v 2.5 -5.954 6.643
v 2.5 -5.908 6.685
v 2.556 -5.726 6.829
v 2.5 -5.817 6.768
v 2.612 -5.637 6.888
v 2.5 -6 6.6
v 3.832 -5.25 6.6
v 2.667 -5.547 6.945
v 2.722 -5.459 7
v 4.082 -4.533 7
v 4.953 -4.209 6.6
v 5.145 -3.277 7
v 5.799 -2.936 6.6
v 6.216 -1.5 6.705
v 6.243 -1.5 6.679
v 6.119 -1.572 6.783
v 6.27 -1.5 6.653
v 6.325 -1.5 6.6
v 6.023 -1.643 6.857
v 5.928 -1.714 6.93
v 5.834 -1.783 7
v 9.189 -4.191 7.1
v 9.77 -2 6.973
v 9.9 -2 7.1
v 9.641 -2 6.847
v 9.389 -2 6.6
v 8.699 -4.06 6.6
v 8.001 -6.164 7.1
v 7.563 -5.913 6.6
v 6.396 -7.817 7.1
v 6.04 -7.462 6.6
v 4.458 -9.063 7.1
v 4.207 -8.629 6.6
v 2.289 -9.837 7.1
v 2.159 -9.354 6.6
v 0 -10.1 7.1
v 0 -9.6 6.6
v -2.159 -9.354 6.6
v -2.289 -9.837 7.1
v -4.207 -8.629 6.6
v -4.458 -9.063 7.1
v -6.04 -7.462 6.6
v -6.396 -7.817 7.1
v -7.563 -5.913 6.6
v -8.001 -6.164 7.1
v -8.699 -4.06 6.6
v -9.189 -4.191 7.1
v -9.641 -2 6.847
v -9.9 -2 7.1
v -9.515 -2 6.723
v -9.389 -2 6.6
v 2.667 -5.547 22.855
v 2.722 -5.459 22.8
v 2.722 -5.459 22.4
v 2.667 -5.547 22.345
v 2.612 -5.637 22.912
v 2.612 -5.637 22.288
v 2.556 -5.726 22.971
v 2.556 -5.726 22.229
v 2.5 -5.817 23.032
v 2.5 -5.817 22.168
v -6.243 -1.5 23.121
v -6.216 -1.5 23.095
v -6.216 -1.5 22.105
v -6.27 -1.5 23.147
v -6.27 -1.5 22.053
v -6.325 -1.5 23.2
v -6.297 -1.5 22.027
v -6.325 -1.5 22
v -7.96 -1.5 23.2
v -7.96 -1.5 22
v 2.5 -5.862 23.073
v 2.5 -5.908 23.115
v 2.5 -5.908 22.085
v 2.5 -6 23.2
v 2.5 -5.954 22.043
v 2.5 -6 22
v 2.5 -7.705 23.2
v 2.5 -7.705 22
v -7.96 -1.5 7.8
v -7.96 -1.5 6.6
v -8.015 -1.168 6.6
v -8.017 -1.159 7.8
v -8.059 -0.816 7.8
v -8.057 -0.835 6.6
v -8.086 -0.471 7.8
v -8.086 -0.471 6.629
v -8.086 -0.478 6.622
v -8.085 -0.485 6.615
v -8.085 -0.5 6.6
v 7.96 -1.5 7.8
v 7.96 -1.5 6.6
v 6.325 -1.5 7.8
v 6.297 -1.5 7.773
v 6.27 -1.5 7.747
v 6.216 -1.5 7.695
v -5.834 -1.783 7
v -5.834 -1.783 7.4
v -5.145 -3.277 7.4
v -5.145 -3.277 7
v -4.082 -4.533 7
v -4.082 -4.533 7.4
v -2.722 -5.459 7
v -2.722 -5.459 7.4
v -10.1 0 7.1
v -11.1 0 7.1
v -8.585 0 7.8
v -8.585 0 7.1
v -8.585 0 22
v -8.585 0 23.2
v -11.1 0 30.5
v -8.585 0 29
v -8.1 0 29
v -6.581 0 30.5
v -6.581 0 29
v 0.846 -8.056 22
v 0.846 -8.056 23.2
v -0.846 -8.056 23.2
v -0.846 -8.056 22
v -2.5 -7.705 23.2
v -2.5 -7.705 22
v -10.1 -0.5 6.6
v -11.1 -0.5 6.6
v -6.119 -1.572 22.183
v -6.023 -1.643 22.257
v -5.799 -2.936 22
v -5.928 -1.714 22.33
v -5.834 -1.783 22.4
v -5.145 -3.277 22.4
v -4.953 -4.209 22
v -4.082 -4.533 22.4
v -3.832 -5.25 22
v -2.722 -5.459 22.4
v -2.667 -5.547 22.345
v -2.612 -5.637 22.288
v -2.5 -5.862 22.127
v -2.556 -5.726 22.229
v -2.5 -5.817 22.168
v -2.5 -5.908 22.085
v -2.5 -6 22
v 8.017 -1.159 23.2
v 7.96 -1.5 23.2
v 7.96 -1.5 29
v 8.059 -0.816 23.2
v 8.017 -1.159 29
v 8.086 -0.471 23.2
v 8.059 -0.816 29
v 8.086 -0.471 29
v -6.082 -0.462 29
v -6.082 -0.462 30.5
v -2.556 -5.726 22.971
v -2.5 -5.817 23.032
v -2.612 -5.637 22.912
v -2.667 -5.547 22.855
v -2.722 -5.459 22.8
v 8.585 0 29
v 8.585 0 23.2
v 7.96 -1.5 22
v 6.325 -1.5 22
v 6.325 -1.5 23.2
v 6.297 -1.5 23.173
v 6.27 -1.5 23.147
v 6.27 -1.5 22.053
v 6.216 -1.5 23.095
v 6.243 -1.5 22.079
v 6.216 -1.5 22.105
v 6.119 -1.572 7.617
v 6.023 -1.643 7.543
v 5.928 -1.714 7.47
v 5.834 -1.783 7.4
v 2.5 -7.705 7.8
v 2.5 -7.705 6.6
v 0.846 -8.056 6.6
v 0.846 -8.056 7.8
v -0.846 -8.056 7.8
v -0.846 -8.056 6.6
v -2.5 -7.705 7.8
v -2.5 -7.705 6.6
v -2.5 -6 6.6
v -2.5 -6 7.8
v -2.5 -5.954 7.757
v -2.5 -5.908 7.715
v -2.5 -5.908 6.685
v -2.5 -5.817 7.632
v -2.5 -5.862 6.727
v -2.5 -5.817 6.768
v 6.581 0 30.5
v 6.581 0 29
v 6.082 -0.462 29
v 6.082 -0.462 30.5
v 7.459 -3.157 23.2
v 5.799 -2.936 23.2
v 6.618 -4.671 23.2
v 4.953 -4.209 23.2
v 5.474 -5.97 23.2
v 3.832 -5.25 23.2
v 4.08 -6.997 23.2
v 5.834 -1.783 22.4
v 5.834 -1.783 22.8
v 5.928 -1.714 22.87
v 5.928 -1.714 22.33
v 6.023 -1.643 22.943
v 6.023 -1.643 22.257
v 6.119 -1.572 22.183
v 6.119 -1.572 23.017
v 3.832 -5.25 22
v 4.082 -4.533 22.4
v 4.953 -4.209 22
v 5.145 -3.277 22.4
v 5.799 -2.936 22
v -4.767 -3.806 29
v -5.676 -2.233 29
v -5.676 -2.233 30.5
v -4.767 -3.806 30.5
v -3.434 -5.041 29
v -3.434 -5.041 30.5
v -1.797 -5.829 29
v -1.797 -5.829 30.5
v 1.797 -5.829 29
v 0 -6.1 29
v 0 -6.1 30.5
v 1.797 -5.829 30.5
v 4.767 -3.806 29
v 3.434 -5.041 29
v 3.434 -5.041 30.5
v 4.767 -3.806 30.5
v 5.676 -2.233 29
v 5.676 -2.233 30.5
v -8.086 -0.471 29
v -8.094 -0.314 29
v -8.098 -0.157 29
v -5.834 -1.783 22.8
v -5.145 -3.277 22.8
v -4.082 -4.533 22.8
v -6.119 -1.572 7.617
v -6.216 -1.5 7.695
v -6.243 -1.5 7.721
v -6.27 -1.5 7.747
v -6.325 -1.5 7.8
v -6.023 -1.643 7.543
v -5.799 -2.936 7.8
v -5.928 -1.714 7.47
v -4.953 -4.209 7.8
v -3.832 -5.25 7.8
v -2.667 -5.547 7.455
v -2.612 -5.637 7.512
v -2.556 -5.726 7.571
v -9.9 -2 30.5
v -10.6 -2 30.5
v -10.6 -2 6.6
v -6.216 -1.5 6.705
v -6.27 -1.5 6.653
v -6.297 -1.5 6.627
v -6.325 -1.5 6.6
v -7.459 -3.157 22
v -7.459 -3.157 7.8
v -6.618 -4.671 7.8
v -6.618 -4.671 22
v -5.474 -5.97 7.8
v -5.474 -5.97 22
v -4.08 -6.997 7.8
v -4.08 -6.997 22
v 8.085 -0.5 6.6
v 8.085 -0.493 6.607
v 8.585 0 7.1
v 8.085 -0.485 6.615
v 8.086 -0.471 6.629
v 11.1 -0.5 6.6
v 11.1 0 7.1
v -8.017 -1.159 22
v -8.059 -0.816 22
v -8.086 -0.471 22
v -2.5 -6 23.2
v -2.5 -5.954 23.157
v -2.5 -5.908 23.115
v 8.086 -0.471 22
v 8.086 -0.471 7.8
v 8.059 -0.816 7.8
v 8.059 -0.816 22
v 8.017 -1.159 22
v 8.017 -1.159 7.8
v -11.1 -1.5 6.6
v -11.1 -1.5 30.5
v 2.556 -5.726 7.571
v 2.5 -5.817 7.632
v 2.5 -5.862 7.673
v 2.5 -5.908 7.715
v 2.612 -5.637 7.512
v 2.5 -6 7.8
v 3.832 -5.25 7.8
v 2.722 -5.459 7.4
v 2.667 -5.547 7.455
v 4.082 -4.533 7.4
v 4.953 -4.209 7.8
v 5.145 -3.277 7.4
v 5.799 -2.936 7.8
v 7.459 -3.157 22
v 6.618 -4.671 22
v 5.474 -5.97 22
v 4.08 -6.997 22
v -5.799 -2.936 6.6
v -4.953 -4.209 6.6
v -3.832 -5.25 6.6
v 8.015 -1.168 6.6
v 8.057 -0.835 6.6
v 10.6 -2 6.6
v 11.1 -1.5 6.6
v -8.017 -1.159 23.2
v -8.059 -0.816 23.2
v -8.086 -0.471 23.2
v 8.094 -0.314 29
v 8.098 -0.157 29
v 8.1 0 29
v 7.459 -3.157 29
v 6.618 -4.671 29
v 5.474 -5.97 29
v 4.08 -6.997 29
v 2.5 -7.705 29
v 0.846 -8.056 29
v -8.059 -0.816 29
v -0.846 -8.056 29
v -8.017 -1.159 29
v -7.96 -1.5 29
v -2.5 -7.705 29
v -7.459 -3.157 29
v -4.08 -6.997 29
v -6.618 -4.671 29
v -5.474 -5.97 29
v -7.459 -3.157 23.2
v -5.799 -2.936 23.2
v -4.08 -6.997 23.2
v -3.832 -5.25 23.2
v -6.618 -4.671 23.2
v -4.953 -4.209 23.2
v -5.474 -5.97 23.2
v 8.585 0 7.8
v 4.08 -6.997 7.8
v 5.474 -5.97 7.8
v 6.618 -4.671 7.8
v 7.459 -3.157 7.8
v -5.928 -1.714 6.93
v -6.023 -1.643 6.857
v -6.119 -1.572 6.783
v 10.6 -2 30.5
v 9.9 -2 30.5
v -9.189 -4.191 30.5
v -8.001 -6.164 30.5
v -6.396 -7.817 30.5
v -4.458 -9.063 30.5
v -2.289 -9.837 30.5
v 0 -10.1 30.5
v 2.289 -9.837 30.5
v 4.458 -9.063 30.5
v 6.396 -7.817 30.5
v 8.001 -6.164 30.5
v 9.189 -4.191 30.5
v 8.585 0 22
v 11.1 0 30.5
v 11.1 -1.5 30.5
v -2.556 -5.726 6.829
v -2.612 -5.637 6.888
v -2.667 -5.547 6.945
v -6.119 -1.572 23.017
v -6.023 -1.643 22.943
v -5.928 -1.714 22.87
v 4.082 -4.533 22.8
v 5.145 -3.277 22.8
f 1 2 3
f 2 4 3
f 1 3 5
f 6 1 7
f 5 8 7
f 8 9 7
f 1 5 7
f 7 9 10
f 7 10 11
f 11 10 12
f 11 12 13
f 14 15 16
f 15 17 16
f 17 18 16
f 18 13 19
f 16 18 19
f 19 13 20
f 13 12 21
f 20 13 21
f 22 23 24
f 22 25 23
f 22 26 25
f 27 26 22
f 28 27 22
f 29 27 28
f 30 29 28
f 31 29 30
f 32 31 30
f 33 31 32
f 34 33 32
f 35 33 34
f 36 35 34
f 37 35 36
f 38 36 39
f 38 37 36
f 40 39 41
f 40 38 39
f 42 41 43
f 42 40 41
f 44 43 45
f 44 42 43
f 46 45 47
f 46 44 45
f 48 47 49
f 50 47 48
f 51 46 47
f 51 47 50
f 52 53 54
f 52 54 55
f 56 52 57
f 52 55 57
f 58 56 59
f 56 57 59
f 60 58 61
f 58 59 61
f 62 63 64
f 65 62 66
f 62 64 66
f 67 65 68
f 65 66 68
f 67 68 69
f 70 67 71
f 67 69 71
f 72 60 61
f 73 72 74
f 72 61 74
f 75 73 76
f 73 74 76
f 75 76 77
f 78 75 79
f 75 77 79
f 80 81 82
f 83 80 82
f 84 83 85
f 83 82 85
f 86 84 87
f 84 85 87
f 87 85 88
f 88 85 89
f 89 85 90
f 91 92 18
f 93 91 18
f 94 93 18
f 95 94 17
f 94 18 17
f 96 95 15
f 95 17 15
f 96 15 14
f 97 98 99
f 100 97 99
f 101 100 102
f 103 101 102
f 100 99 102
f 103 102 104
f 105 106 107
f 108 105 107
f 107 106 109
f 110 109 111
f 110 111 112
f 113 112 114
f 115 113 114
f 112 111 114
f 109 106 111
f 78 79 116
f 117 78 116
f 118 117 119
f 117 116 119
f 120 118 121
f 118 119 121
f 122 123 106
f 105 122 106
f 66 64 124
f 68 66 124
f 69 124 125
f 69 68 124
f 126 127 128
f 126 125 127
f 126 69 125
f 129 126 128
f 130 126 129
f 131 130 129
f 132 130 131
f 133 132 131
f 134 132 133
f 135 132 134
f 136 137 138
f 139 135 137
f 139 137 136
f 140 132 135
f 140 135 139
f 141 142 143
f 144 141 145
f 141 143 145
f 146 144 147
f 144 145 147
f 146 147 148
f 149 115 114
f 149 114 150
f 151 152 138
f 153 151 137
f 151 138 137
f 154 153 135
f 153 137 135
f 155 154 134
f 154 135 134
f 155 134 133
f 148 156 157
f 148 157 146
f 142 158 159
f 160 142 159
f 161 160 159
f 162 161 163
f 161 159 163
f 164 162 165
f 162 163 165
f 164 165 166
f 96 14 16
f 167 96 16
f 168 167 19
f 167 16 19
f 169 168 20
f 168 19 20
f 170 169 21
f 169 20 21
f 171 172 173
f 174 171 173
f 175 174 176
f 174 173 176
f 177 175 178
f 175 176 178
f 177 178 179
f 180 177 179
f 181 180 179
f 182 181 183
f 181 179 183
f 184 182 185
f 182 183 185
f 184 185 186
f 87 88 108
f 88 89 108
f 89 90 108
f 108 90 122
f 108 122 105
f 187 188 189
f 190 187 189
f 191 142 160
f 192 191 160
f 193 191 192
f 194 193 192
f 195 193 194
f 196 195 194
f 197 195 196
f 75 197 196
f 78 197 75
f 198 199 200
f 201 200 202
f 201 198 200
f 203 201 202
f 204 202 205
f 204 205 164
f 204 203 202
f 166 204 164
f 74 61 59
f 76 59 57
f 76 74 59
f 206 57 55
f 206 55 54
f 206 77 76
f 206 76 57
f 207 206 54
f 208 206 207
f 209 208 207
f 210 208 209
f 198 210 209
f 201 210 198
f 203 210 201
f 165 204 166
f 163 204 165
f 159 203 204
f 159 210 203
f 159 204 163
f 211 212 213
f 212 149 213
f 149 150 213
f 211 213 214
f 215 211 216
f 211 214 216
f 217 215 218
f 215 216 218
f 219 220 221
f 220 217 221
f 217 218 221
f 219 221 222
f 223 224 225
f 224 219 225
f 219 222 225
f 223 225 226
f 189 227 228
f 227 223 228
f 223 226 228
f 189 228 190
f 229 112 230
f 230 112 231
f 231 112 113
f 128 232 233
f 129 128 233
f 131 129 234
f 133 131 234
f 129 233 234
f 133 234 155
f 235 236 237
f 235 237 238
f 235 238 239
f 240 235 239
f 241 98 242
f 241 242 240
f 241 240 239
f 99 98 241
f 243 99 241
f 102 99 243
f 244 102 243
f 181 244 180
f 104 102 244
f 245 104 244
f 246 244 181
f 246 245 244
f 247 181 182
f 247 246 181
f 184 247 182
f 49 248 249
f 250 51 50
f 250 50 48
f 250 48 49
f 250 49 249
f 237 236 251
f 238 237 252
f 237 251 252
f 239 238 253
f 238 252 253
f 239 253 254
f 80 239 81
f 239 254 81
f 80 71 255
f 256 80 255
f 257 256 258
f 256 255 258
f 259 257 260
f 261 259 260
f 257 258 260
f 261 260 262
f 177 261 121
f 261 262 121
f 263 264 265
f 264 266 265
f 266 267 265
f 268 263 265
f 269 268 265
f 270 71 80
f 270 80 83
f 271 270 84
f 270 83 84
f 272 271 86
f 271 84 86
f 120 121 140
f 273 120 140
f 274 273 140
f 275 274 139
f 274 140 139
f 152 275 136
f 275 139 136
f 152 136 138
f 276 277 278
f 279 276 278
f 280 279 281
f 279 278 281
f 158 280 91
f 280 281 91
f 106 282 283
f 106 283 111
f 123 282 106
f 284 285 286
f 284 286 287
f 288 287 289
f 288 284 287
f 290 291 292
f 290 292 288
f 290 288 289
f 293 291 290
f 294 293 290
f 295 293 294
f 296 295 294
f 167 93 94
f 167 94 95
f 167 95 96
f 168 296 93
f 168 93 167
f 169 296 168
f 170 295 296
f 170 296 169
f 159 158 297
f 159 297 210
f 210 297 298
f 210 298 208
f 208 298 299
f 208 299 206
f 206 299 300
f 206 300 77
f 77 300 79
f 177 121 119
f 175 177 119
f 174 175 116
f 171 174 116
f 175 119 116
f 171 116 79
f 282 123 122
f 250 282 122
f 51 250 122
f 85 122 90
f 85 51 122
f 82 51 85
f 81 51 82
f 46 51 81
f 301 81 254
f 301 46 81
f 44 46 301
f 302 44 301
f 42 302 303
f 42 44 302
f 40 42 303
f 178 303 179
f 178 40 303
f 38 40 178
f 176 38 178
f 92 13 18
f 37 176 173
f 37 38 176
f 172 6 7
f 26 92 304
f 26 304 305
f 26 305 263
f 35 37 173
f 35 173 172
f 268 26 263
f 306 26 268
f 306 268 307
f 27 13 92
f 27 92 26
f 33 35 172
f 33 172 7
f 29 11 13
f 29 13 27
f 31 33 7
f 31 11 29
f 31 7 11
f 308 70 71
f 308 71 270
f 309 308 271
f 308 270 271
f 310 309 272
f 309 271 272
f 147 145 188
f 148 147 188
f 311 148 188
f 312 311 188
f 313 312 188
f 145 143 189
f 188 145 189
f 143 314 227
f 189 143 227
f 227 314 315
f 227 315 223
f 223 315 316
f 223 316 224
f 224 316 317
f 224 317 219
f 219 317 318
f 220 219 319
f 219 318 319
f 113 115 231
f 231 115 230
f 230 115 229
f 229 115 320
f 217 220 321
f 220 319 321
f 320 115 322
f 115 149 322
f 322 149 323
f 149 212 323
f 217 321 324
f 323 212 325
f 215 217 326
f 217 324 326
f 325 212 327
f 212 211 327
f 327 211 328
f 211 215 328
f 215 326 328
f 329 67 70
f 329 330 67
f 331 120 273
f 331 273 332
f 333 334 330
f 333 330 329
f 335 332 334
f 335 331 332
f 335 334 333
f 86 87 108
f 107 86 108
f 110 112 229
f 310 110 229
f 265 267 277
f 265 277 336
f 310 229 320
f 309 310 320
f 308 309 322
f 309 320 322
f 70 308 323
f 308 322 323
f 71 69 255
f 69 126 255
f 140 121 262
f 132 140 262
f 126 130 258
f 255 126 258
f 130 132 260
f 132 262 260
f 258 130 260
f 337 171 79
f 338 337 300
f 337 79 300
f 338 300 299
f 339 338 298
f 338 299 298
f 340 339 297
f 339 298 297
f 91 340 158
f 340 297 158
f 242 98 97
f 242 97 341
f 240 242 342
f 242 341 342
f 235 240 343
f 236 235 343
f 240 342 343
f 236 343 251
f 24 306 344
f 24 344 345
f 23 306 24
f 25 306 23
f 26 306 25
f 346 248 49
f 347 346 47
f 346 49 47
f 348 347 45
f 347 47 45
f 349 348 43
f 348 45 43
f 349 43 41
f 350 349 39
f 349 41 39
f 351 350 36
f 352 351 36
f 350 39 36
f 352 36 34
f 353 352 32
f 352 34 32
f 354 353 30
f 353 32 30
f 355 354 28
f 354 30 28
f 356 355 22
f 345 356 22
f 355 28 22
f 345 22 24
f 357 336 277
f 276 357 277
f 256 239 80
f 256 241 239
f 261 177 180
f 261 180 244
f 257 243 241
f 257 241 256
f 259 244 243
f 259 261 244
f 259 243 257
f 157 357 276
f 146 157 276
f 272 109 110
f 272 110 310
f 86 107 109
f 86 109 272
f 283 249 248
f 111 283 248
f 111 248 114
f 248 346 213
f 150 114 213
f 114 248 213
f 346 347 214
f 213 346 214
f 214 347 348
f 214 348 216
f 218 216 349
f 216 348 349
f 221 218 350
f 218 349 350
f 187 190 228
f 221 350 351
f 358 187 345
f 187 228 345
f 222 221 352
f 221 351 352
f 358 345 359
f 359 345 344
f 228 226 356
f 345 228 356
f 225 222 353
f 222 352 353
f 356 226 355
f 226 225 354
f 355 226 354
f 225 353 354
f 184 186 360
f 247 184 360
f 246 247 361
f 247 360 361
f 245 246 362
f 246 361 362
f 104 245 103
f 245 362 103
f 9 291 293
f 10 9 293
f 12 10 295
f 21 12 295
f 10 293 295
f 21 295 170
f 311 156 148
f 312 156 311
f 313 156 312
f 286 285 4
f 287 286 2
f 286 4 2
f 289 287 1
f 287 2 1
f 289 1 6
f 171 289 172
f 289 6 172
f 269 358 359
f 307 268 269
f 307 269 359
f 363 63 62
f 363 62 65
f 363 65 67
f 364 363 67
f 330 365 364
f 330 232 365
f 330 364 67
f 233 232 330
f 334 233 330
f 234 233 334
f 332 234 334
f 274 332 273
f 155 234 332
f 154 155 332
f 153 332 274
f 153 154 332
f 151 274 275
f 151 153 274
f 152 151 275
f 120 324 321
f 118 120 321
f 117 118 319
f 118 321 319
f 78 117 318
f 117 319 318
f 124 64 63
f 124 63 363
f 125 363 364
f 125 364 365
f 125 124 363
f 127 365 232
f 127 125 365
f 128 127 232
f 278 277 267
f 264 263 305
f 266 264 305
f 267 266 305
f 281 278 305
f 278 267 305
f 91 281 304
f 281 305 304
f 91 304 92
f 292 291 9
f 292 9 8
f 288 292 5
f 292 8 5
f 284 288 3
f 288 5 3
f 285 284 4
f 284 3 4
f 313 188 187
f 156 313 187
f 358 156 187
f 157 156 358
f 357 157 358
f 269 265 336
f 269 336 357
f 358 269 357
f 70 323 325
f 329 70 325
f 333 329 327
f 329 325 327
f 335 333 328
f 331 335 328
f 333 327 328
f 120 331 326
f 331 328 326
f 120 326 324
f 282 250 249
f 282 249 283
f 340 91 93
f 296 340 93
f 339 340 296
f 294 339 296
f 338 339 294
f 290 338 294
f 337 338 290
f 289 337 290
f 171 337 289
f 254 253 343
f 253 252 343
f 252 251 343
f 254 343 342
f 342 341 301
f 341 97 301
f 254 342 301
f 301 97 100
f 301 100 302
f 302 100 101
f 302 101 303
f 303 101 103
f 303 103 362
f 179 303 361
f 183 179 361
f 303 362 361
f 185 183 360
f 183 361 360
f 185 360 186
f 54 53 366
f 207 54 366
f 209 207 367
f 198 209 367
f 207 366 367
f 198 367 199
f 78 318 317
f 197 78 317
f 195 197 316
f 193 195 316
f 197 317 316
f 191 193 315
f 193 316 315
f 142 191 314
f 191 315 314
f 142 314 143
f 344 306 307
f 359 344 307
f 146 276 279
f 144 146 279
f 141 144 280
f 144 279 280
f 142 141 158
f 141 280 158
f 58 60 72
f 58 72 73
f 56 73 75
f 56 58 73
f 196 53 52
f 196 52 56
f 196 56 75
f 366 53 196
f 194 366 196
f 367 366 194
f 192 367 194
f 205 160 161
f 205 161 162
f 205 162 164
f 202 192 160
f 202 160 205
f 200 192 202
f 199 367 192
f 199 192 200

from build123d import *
from build123d import SkipClean  # not in build123d's __all__

# Parameters (mm, degrees)
F0_W         = 2
F0_H         = 1.2
F1_ANGLE     = 180
F3_DEPTH     = 29
F5_DEPTH     = 30.5
F6_DEPTH     = 6.6
F7_T1_DEPTH  = 26.471682988
F7_T3_DEPTH  = 14.2
F7_T5_DEPTH  = 2.285841494
F7_T7_DEPTH  = 3.285841494
F7_T9_DEPTH  = 3.9794390696
F7_T11_DEPTH = 3.285841494
F7_T13_DEPTH = 2.285841494
F7_T15_DEPTH = 2.4504714643
F7_T17_DEPTH = 1.2
F7_T19_DEPTH = 5.8
F7_T24_ANGLE = 171.7642778101
F8_T1_DEPTH  = 2.5339152929
F8_T3_DEPTH  = 2.7820723675
F8_T5_DEPTH  = 2.7820723675
F8_T7_DEPTH  = 2.5339152929
F8_T10_ANGLE = 70.8970289143
F8_T12_ANGLE = 70.8970289143
F8_T14_ANGLE = 70.8970289143
F8_T16_ANGLE = 70.8970289143
F8_T18_ANGLE = 70.8970289143
F8_T20_ANGLE = 70.8970289143
F8_T22_ANGLE = 70.8970289143
F8_T24_ANGLE = 70.8970289143


# Not quite as in the source:
# - a fillet or chamfer that OpenCascade refuses, or shapes differently, is made with other operations: its cross-section is extruded or revolved along the edge and cut away or added
# - a feature names something its author has since deleted; it is built from what else it names


with BuildPart() as f1:
    # F0 (on Front) → F1 (revolve)
    with BuildSketch(Plane.XZ):
        Polygon((-10.1, 0), (-8.1, 0), (-8.1, 6.6), (-8.1, 7.8), (-8.1, 12.7), (-8.1, 13.9), (-8.1, 15.8), (-8.1, 17), (-8.1, 22), (-8.1, 23.2), (-8.1, 29), (-10.1, 29), align=None)
        with Locations((-7.1, 22.6)):
            Rectangle(F0_W, F0_H)
        with Locations((-7.1, 7.2)):
            Rectangle(F0_W, F0_H)
        Polygon((-10.1, 30.5), (-10.1, 29), (-8.1, 29), (-6.1, 29), (-6.1, 30.5), align=None)
    revolve(axis=Axis((0, 0, 18.970021978), (0, 0, 1)), revolution_arc=F1_ANGLE)

    # F2 (on face) → F3 (cut, through all)
    with BuildSketch(Plane(origin=(0, 0, 0), x_dir=(1, 0, 0), z_dir=(0, 0, -1))):
        with BuildLine():
            Line((2.5, 5.5641710973), (2.5, 7.7045441137))
            ThreePointArc((2.5, 7.7045441137), (0, 8.1), (-2.5, 7.7045441137))
            Line((-2.5, 7.7045441137), (-2.5, 5.5641710973))
            Line((-2.5, 5.5641710973), (2.5, 5.5641710973))
        make_face()
        with BuildLine():
            ThreePointArc((8.1, 0), (8.0648988191, 0.7532642549), (7.9598994969, 1.5))
            Line((7.9598994969, 1.5), (5.9126981996, 1.5))
            Line((5.9126981996, 1.5), (5.9126981996, 0))
            Line((5.9126981996, 0), (8.1, 0))
        make_face()
        with BuildLine():
            Line((-5.9126981996, 1.5), (-7.9598994969, 1.5))
            ThreePointArc((-7.9598994969, 1.5), (-8.0648988191, 0.7532642549), (-8.1, 0))
            Line((-8.1, 0), (-5.9126981996, 0))
            Line((-5.9126981996, 0), (-5.9126981996, 1.5))
        make_face()
    with SkipClean():  # cleaning this boolean's faces spoils the solid; the shape is the same uncleaned
        extrude(amount=-F3_DEPTH, mode=Mode.SUBTRACT)

    # F4 (on face) → F5 (join, through all)
    with BuildSketch(Plane(origin=(0, 0, 0), x_dir=(1, 0, 0), z_dir=(0, 0, -1))):
        with BuildLine():
            Line((11.1, 2), (9.9, 2))
            ThreePointArc((9.9, 2), (10.0498756211, 1.0049875621), (10.1, 0))
            Line((10.1, 0), (11.1, 0))
            Line((11.1, 0), (11.1, 2))
        make_face()
        with BuildLine():
            Line((-11.1, 0), (-10.1, 0))
            ThreePointArc((-10.1, 0), (-10.0498756211, 1.0049875621), (-9.9, 2))
            Line((-9.9, 2), (-11.1, 2))
            Line((-11.1, 2), (-11.1, 0))
        make_face()
    with SkipClean():  # cleaning this boolean's faces spoils the solid; the shape is the same uncleaned
        extrude(amount=-F5_DEPTH)

    # F4 (on face) + F2 (on face) → F6 (cut, through all)
    with BuildSketch(Plane(origin=(0, 0, 0), x_dir=(1, 0, 0), z_dir=(0, 0, -1))):
        with BuildLine():
            Line((-9.1, 2), (-9.1, 0))
            Line((-9.1, 0), (-8.1, 0))
            ThreePointArc((-8.1, 0), (-8.0648988191, 0.7532642549), (-7.9598994969, 1.5))
            ThreePointArc((-7.9598994969, 1.5), (-6.0808277632, 5.3510310889), (-2.5, 7.7045441137))
            ThreePointArc((-2.5, 7.7045441137), (0, 8.1), (2.5, 7.7045441137))
            ThreePointArc((2.5, 7.7045441137), (6.0808277632, 5.3510310889), (7.9598994969, 1.5))
            ThreePointArc((7.9598994969, 1.5), (8.0648988191, 0.7532642549), (8.1, 0))
            Line((8.1, 0), (9.1, 0))
            Line((9.1, 0), (9.1, 2))
            Line((9.1, 2), (9.9, 2))
            ThreePointArc((9.9, 2), (0, 10.1), (-9.9, 2))
            Line((-9.9, 2), (-9.1, 2))
        make_face()
        with BuildLine():
            Line((-11.1, 0), (-10.1, 0))
            ThreePointArc((-10.1, 0), (-10.0498756211, 1.0049875621), (-9.9, 2))
            Line((-9.9, 2), (-11.1, 2))
            Line((-11.1, 2), (-11.1, 0))
        make_face()
        with BuildLine():
            Line((-10.1, 0), (-9.1, 0))
            Line((-9.1, 0), (-9.1, 2))
            Line((-9.1, 2), (-9.9, 2))
            ThreePointArc((-9.9, 2), (-10.0498756211, 1.0049875621), (-10.1, 0))
        make_face()
        with BuildLine():
            Line((11.1, 2), (9.9, 2))
            ThreePointArc((9.9, 2), (10.0498756211, 1.0049875621), (10.1, 0))
            Line((10.1, 0), (11.1, 0))
            Line((11.1, 0), (11.1, 2))
        make_face()
    with BuildSketch(Plane(origin=(0, 0, 0), x_dir=(1, 0, 0), z_dir=(0, 0, -1))):
        with BuildLine():
            ThreePointArc((-2.5, 7.7045441137), (0, 8.1), (2.5, 7.7045441137))
            ThreePointArc((2.5, 7.7045441137), (6.0808277632, 5.3510310889), (7.9598994969, 1.5))
            ThreePointArc((7.9598994969, 1.5), (8.0648988191, 0.7532642549), (8.1, 0))
            Line((8.1, 0), (10.1, 0))
            ThreePointArc((10.1, 0), (0, 10.1), (-10.1, 0))
            Line((-10.1, 0), (-8.1, 0))
            ThreePointArc((-8.1, 0), (-8.0648988191, 0.7532642549), (-7.9598994969, 1.5))
            ThreePointArc((-7.9598994969, 1.5), (-6.0808277632, 5.3510310889), (-2.5, 7.7045441137))
        make_face()
    with SkipClean():  # cleaning this boolean's faces spoils the solid; the shape is the same uncleaned
        extrude(amount=-F6_DEPTH, mode=Mode.SUBTRACT)

    # F7: chamfer of 0.5 on 11 edges, made by hand

    # F7_s2 → F7_t1 (cut)
    with BuildSketch(Plane.XY.offset(5.314158506)):
        Polygon((-10.6, -2), (-11.1, -1.5), (-11.1, -2), align=None)
        Polygon((10.6, -2), (11.1, -1.5), (11.1, -2), align=None)
    with SkipClean():  # cleaning this boolean's faces spoils the solid; the shape is the same uncleaned
        extrude(amount=F7_T1_DEPTH, mode=Mode.SUBTRACT)

    # F7_s4 → F7_t3 (cut)
    with BuildSketch(Plane.XY.offset(7.8)):
        with BuildLine():
            Line((8.5854528128, 0), (8.0862985795, -0.4709302326))
            ThreePointArc((8.0862985795, -0.4709302326), (8.0963649191, -0.2426419097), (8.1, 0))
            Line((8.1, 0), (8.5854528128, 0))
        make_face()
        with BuildLine():
            Line((-8.5854528128, 0), (-8.0862985795, -0.4709302326))
            ThreePointArc((-8.0862985795, -0.4709302326), (-8.0963649191, -0.2426419097), (-8.1, 0))
            Line((-8.1, 0), (-8.5854528128, 0))
        make_face()
    extrude(amount=F7_T3_DEPTH, mode=Mode.SUBTRACT)

    # F7_s6 → F7_t5 (cut)
    with BuildSketch(Plane.YZ.offset(-12.385841494)):
        Polygon((-0.5, 6.6), (0, 7.1), (0, 6.6), align=None)
    extrude(amount=F7_T5_DEPTH, mode=Mode.SUBTRACT)

    # F7_s8 → F7_t7 (cut)
    with BuildSketch(Plane.YZ.offset(-10.1)):
        Polygon((-0.5, 6.6), (0, 7.1), (0, 6.6), align=None)
    extrude(amount=F7_T7_DEPTH, mode=Mode.SUBTRACT)

    # F7_s10 → F7_t9 (cut)
    with BuildSketch(Plane.XY.offset(27.7602804652)):
        with BuildLine():
            Line((-6.5810333535, 0), (-6.0824702207, -0.4621212121))
            ThreePointArc((-6.0824702207, -0.4621212121), (-6.0953433287, -0.2383059061), (-6.1, 0))
            Line((-6.1, 0), (-6.5810333535, 0))
        make_face()
        with BuildLine():
            Line((6.5810333535, 0), (6.0824702207, -0.4621212121))
            ThreePointArc((6.0824702207, -0.4621212121), (6.0953433287, -0.2383059061), (6.1, 0))
            Line((6.1, 0), (6.5810333535, 0))
        make_face()
    with SkipClean():  # cleaning this boolean's faces spoils the solid; the shape is the same uncleaned
        extrude(amount=F7_T9_DEPTH, mode=Mode.SUBTRACT)

    # F7_s12 → F7_t11 (cut)
    with BuildSketch(Plane.YZ.offset(6.814158506)):
        Polygon((-0.5, 6.6), (0, 7.1), (0, 6.6), align=None)
    extrude(amount=F7_T11_DEPTH, mode=Mode.SUBTRACT)

    # F7_s14 → F7_t13 (cut)
    with BuildSketch(Plane.YZ.offset(10.1)):
        Polygon((-0.5, 6.6), (0, 7.1), (0, 6.6), align=None)
    extrude(amount=F7_T13_DEPTH, mode=Mode.SUBTRACT)

    # F7_s16 → F7_t15 (cut)
    with BuildSketch(Plane.XY.offset(5.3495285357)):
        with BuildLine():
            Line((-8.0862985795, -0.4709302326), (-8.5854528128, 0))
            Line((-8.5854528128, 0), (-8.1, 0))
            ThreePointArc((-8.1, 0), (-8.0963649191, -0.2426419097), (-8.0862985795, -0.4709302326))
        make_face()
        with BuildLine():
            Line((8.0862985795, -0.4709302326), (8.5854528128, 0))
            Line((8.5854528128, 0), (8.1, 0))
            ThreePointArc((8.1, 0), (8.0963649191, -0.2426419097), (8.0862985795, -0.4709302326))
        make_face()
    with SkipClean():  # cleaning this boolean's faces spoils the solid; the shape is the same uncleaned
        extrude(amount=F7_T15_DEPTH, mode=Mode.SUBTRACT)

    # F7_s18 → F7_t17 (cut)
    with BuildSketch(Plane.XY.offset(22)):
        with BuildLine():
            Line((-8.5854528128, 0), (-8.0862985795, -0.4709302326))
            ThreePointArc((-8.0862985795, -0.4709302326), (-8.0963649191, -0.2426419097), (-8.1, 0))
            Line((-8.1, 0), (-8.5854528128, 0))
        make_face()
        with BuildLine():
            Line((8.5854528128, 0), (8.0862985795, -0.4709302326))
            ThreePointArc((8.0862985795, -0.4709302326), (8.0963649191, -0.2426419097), (8.1, 0))
            Line((8.1, 0), (8.5854528128, 0))
        make_face()
    with SkipClean():  # cleaning this boolean's faces spoils the solid; the shape is the same uncleaned
        extrude(amount=F7_T17_DEPTH, mode=Mode.SUBTRACT)

    # F7_s20 → F7_t19 (cut)
    with BuildSketch(Plane.XY.offset(23.2)):
        with BuildLine():
            Line((-8.5854528128, 0), (-8.0862985795, -0.4709302326))
            ThreePointArc((-8.0862985795, -0.4709302326), (-8.0963649191, -0.2426419097), (-8.1, 0))
            Line((-8.1, 0), (-8.5854528128, 0))
        make_face()
        with BuildLine():
            Line((8.5854528128, 0), (8.0862985795, -0.4709302326))
            ThreePointArc((8.0862985795, -0.4709302326), (8.0963649191, -0.2426419097), (8.1, 0))
            Line((8.1, 0), (8.5854528128, 0))
        make_face()
    with SkipClean():  # cleaning this boolean's faces spoils the solid; the shape is the same uncleaned
        extrude(amount=F7_T19_DEPTH, mode=Mode.SUBTRACT)


with BuildPart() as f7_tool22:
    # F7_s23 → F7_t24 (revolve)
    with BuildSketch(Plane(origin=(0, 0, 0), x_dir=(0, 0, 1), z_dir=(0.071808378, 0.9974184462, 0))):
        Polygon((7.1, 10.1), (6.6, 9.6), (6.6, 10.1), align=None)
    revolve(axis=Axis((0, 0, 6.6), (0, 0, -1)), revolution_arc=F7_T24_ANGLE)

    split(bisect_by=Plane.XZ.offset(2), keep=Keep.TOP)


with BuildPart() as f1_1:
    add(f1.part, clean=False)

    # F7_t21: cut F7_tool22
    add(f7_tool22.part, mode=Mode.SUBTRACT)

    # F8: chamfer of 0.4 on 16 edges, made by hand

    # F8_s2 → F8_t1 (cut)
    with BuildSketch(Plane.XY.offset(5.9330423536)):
        with BuildLine():
            Line((2.7215384615, -5.4592333164), (2.5, -5.8172158289))
            Line((2.5, -5.8172158289), (2.5, -5.5641710973))
            ThreePointArc((2.5, -5.5641710973), (2.6173705778, -5.5099338706), (2.7215384615, -5.4592333164))
        make_face()
        with BuildLine():
            Line((-2.5, -5.8172158289), (-2.7215384615, -5.4592333164))
            ThreePointArc((-2.7215384615, -5.4592333164), (-2.6173705778, -5.5099338706), (-2.5, -5.5641710973))
            Line((-2.5, -5.5641710973), (-2.5, -5.8172158289))
        make_face()
    extrude(amount=F8_T1_DEPTH, mode=Mode.SUBTRACT)

    # F8_s4 → F8_t3 (cut)
    with BuildSketch(Plane.XY.offset(5.8089638162)):
        with BuildLine():
            Line((6.2161081072, -1.5), (5.8335783775, -1.7830769231))
            ThreePointArc((5.8335783775, -1.7830769231), (5.8731388435, -1.6481019766), (5.9126981996, -1.5))
            Line((5.9126981996, -1.5), (6.2161081072, -1.5))
        make_face()
        with BuildLine():
            Line((-5.8335783775, -1.7830769231), (-6.2161081072, -1.5))
            Line((-6.2161081072, -1.5), (-5.9126981996, -1.5))
            ThreePointArc((-5.9126981996, -1.5), (-5.8731388435, -1.6481019766), (-5.8335783775, -1.7830769231))
        make_face()
    extrude(amount=F8_T3_DEPTH, mode=Mode.SUBTRACT)

    # F8_s6 → F8_t5 (cut)
    with BuildSketch(Plane.XY.offset(21.2089638162)):
        with BuildLine():
            Line((-6.2161081072, -1.5), (-5.8335783775, -1.7830769231))
            ThreePointArc((-5.8335783775, -1.7830769231), (-5.8731388435, -1.6481019766), (-5.9126981996, -1.5))
            Line((-5.9126981996, -1.5), (-6.2161081072, -1.5))
        make_face()
        with BuildLine():
            Line((5.8335783775, -1.7830769231), (6.2161081072, -1.5))
            Line((6.2161081072, -1.5), (5.9126981996, -1.5))
            ThreePointArc((5.9126981996, -1.5), (5.8731388435, -1.6481019766), (5.8335783775, -1.7830769231))
        make_face()
    extrude(amount=F8_T5_DEPTH, mode=Mode.SUBTRACT)

    # F8_s8 → F8_t7 (cut)
    with BuildSketch(Plane.XY.offset(21.3330423536)):
        with BuildLine():
            Line((-2.5, -5.8172158289), (-2.7215384615, -5.4592333164))
            ThreePointArc((-2.7215384615, -5.4592333164), (-2.6173705778, -5.5099338706), (-2.5, -5.5641710973))
            Line((-2.5, -5.5641710973), (-2.5, -5.8172158289))
        make_face()
        with BuildLine():
            Line((2.7215384615, -5.4592333164), (2.5, -5.8172158289))
            Line((2.5, -5.8172158289), (2.5, -5.5641710973))
            ThreePointArc((2.5, -5.5641710973), (2.6173705778, -5.5099338706), (2.7215384615, -5.4592333164))
        make_face()
    extrude(amount=F8_T7_DEPTH, mode=Mode.SUBTRACT)

    # F8_s9 → F8_t10 (revolve, cut)
    with BuildSketch(Plane(origin=(0, 0, 0), x_dir=(0, 0, 1), z_dir=(-0.968011189, -0.2509070307, 0))):
        Polygon((7.8, -6.5), (7.4, -6.1), (7.8, -6.1), align=None)
    revolve(axis=Axis((0, 0, 7.8), (0, 0, 1)), revolution_arc=F8_T10_ANGLE, mode=Mode.SUBTRACT)

    # F8_s11 → F8_t12 (revolve, cut)
    with BuildSketch(Plane(origin=(0, 0, 0), x_dir=(0, 0, 1), z_dir=(-0.968011189, -0.2509070307, 0))):
        Polygon((6.6, -6.5), (7, -6.1), (6.6, -6.1), align=None)
    revolve(axis=Axis((0, 0, 6.6), (0, 0, 1)), revolution_arc=F8_T12_ANGLE, mode=Mode.SUBTRACT)

    # F8_s13 → F8_t14 (revolve, cut)
    with BuildSketch(Plane(origin=(0, 0, 0), x_dir=(0, 0, 1), z_dir=(-0.0797079521, 0.9968182594, 0))):
        Polygon((7.8, -6.5), (7.4, -6.1), (7.8, -6.1), align=None)
    revolve(axis=Axis((0, 0, 7.8), (0, 0, 1)), revolution_arc=F8_T14_ANGLE, mode=Mode.SUBTRACT)

    # F8_s15 → F8_t16 (revolve, cut)
    with BuildSketch(Plane(origin=(0, 0, 0), x_dir=(0, 0, 1), z_dir=(-0.0797079521, 0.9968182594, 0))):
        Polygon((6.6, -6.5), (7, -6.1), (6.6, -6.1), align=None)
    revolve(axis=Axis((0, 0, 6.6), (0, 0, 1)), revolution_arc=F8_T16_ANGLE, mode=Mode.SUBTRACT)

    # F8_s17 → F8_t18 (revolve, cut)
    with BuildSketch(Plane(origin=(0, 0, 0), x_dir=(0, 0, 1), z_dir=(-0.0797079521, 0.9968182594, 0))):
        Polygon((23.2, -6.5), (22.8, -6.1), (23.2, -6.1), align=None)
    revolve(axis=Axis((0, 0, 23.2), (0, 0, 1)), revolution_arc=F8_T18_ANGLE, mode=Mode.SUBTRACT)

    # F8_s19 → F8_t20 (revolve, cut)
    with BuildSketch(Plane(origin=(0, 0, 0), x_dir=(0, 0, 1), z_dir=(-0.0797079521, 0.9968182594, 0))):
        Polygon((22.4, -6.1), (22, -6.5), (22, -6.1), align=None)
    revolve(axis=Axis((0, 0, 22), (0, 0, 1)), revolution_arc=F8_T20_ANGLE, mode=Mode.SUBTRACT)

    # F8_s21 → F8_t22 (revolve, cut)
    with BuildSketch(Plane(origin=(0, 0, 0), x_dir=(0, 0, 1), z_dir=(-0.968011189, -0.2509070307, 0))):
        Polygon((23.2, -6.5), (22.8, -6.1), (23.2, -6.1), align=None)
    revolve(axis=Axis((0, 0, 23.2), (0, 0, 1)), revolution_arc=F8_T22_ANGLE, mode=Mode.SUBTRACT)

    # F8_s23 → F8_t24 (revolve, cut)
    with BuildSketch(Plane(origin=(0, 0, 0), x_dir=(0, 0, 1), z_dir=(-0.968011189, -0.2509070307, 0))):
        Polygon((22.4, -6.1), (22, -6.5), (22, -6.1), align=None)
    revolve(axis=Axis((0, 0, 22), (0, 0, 1)), revolution_arc=F8_T24_ANGLE, mode=Mode.SUBTRACT)


solid = f1_1.part
